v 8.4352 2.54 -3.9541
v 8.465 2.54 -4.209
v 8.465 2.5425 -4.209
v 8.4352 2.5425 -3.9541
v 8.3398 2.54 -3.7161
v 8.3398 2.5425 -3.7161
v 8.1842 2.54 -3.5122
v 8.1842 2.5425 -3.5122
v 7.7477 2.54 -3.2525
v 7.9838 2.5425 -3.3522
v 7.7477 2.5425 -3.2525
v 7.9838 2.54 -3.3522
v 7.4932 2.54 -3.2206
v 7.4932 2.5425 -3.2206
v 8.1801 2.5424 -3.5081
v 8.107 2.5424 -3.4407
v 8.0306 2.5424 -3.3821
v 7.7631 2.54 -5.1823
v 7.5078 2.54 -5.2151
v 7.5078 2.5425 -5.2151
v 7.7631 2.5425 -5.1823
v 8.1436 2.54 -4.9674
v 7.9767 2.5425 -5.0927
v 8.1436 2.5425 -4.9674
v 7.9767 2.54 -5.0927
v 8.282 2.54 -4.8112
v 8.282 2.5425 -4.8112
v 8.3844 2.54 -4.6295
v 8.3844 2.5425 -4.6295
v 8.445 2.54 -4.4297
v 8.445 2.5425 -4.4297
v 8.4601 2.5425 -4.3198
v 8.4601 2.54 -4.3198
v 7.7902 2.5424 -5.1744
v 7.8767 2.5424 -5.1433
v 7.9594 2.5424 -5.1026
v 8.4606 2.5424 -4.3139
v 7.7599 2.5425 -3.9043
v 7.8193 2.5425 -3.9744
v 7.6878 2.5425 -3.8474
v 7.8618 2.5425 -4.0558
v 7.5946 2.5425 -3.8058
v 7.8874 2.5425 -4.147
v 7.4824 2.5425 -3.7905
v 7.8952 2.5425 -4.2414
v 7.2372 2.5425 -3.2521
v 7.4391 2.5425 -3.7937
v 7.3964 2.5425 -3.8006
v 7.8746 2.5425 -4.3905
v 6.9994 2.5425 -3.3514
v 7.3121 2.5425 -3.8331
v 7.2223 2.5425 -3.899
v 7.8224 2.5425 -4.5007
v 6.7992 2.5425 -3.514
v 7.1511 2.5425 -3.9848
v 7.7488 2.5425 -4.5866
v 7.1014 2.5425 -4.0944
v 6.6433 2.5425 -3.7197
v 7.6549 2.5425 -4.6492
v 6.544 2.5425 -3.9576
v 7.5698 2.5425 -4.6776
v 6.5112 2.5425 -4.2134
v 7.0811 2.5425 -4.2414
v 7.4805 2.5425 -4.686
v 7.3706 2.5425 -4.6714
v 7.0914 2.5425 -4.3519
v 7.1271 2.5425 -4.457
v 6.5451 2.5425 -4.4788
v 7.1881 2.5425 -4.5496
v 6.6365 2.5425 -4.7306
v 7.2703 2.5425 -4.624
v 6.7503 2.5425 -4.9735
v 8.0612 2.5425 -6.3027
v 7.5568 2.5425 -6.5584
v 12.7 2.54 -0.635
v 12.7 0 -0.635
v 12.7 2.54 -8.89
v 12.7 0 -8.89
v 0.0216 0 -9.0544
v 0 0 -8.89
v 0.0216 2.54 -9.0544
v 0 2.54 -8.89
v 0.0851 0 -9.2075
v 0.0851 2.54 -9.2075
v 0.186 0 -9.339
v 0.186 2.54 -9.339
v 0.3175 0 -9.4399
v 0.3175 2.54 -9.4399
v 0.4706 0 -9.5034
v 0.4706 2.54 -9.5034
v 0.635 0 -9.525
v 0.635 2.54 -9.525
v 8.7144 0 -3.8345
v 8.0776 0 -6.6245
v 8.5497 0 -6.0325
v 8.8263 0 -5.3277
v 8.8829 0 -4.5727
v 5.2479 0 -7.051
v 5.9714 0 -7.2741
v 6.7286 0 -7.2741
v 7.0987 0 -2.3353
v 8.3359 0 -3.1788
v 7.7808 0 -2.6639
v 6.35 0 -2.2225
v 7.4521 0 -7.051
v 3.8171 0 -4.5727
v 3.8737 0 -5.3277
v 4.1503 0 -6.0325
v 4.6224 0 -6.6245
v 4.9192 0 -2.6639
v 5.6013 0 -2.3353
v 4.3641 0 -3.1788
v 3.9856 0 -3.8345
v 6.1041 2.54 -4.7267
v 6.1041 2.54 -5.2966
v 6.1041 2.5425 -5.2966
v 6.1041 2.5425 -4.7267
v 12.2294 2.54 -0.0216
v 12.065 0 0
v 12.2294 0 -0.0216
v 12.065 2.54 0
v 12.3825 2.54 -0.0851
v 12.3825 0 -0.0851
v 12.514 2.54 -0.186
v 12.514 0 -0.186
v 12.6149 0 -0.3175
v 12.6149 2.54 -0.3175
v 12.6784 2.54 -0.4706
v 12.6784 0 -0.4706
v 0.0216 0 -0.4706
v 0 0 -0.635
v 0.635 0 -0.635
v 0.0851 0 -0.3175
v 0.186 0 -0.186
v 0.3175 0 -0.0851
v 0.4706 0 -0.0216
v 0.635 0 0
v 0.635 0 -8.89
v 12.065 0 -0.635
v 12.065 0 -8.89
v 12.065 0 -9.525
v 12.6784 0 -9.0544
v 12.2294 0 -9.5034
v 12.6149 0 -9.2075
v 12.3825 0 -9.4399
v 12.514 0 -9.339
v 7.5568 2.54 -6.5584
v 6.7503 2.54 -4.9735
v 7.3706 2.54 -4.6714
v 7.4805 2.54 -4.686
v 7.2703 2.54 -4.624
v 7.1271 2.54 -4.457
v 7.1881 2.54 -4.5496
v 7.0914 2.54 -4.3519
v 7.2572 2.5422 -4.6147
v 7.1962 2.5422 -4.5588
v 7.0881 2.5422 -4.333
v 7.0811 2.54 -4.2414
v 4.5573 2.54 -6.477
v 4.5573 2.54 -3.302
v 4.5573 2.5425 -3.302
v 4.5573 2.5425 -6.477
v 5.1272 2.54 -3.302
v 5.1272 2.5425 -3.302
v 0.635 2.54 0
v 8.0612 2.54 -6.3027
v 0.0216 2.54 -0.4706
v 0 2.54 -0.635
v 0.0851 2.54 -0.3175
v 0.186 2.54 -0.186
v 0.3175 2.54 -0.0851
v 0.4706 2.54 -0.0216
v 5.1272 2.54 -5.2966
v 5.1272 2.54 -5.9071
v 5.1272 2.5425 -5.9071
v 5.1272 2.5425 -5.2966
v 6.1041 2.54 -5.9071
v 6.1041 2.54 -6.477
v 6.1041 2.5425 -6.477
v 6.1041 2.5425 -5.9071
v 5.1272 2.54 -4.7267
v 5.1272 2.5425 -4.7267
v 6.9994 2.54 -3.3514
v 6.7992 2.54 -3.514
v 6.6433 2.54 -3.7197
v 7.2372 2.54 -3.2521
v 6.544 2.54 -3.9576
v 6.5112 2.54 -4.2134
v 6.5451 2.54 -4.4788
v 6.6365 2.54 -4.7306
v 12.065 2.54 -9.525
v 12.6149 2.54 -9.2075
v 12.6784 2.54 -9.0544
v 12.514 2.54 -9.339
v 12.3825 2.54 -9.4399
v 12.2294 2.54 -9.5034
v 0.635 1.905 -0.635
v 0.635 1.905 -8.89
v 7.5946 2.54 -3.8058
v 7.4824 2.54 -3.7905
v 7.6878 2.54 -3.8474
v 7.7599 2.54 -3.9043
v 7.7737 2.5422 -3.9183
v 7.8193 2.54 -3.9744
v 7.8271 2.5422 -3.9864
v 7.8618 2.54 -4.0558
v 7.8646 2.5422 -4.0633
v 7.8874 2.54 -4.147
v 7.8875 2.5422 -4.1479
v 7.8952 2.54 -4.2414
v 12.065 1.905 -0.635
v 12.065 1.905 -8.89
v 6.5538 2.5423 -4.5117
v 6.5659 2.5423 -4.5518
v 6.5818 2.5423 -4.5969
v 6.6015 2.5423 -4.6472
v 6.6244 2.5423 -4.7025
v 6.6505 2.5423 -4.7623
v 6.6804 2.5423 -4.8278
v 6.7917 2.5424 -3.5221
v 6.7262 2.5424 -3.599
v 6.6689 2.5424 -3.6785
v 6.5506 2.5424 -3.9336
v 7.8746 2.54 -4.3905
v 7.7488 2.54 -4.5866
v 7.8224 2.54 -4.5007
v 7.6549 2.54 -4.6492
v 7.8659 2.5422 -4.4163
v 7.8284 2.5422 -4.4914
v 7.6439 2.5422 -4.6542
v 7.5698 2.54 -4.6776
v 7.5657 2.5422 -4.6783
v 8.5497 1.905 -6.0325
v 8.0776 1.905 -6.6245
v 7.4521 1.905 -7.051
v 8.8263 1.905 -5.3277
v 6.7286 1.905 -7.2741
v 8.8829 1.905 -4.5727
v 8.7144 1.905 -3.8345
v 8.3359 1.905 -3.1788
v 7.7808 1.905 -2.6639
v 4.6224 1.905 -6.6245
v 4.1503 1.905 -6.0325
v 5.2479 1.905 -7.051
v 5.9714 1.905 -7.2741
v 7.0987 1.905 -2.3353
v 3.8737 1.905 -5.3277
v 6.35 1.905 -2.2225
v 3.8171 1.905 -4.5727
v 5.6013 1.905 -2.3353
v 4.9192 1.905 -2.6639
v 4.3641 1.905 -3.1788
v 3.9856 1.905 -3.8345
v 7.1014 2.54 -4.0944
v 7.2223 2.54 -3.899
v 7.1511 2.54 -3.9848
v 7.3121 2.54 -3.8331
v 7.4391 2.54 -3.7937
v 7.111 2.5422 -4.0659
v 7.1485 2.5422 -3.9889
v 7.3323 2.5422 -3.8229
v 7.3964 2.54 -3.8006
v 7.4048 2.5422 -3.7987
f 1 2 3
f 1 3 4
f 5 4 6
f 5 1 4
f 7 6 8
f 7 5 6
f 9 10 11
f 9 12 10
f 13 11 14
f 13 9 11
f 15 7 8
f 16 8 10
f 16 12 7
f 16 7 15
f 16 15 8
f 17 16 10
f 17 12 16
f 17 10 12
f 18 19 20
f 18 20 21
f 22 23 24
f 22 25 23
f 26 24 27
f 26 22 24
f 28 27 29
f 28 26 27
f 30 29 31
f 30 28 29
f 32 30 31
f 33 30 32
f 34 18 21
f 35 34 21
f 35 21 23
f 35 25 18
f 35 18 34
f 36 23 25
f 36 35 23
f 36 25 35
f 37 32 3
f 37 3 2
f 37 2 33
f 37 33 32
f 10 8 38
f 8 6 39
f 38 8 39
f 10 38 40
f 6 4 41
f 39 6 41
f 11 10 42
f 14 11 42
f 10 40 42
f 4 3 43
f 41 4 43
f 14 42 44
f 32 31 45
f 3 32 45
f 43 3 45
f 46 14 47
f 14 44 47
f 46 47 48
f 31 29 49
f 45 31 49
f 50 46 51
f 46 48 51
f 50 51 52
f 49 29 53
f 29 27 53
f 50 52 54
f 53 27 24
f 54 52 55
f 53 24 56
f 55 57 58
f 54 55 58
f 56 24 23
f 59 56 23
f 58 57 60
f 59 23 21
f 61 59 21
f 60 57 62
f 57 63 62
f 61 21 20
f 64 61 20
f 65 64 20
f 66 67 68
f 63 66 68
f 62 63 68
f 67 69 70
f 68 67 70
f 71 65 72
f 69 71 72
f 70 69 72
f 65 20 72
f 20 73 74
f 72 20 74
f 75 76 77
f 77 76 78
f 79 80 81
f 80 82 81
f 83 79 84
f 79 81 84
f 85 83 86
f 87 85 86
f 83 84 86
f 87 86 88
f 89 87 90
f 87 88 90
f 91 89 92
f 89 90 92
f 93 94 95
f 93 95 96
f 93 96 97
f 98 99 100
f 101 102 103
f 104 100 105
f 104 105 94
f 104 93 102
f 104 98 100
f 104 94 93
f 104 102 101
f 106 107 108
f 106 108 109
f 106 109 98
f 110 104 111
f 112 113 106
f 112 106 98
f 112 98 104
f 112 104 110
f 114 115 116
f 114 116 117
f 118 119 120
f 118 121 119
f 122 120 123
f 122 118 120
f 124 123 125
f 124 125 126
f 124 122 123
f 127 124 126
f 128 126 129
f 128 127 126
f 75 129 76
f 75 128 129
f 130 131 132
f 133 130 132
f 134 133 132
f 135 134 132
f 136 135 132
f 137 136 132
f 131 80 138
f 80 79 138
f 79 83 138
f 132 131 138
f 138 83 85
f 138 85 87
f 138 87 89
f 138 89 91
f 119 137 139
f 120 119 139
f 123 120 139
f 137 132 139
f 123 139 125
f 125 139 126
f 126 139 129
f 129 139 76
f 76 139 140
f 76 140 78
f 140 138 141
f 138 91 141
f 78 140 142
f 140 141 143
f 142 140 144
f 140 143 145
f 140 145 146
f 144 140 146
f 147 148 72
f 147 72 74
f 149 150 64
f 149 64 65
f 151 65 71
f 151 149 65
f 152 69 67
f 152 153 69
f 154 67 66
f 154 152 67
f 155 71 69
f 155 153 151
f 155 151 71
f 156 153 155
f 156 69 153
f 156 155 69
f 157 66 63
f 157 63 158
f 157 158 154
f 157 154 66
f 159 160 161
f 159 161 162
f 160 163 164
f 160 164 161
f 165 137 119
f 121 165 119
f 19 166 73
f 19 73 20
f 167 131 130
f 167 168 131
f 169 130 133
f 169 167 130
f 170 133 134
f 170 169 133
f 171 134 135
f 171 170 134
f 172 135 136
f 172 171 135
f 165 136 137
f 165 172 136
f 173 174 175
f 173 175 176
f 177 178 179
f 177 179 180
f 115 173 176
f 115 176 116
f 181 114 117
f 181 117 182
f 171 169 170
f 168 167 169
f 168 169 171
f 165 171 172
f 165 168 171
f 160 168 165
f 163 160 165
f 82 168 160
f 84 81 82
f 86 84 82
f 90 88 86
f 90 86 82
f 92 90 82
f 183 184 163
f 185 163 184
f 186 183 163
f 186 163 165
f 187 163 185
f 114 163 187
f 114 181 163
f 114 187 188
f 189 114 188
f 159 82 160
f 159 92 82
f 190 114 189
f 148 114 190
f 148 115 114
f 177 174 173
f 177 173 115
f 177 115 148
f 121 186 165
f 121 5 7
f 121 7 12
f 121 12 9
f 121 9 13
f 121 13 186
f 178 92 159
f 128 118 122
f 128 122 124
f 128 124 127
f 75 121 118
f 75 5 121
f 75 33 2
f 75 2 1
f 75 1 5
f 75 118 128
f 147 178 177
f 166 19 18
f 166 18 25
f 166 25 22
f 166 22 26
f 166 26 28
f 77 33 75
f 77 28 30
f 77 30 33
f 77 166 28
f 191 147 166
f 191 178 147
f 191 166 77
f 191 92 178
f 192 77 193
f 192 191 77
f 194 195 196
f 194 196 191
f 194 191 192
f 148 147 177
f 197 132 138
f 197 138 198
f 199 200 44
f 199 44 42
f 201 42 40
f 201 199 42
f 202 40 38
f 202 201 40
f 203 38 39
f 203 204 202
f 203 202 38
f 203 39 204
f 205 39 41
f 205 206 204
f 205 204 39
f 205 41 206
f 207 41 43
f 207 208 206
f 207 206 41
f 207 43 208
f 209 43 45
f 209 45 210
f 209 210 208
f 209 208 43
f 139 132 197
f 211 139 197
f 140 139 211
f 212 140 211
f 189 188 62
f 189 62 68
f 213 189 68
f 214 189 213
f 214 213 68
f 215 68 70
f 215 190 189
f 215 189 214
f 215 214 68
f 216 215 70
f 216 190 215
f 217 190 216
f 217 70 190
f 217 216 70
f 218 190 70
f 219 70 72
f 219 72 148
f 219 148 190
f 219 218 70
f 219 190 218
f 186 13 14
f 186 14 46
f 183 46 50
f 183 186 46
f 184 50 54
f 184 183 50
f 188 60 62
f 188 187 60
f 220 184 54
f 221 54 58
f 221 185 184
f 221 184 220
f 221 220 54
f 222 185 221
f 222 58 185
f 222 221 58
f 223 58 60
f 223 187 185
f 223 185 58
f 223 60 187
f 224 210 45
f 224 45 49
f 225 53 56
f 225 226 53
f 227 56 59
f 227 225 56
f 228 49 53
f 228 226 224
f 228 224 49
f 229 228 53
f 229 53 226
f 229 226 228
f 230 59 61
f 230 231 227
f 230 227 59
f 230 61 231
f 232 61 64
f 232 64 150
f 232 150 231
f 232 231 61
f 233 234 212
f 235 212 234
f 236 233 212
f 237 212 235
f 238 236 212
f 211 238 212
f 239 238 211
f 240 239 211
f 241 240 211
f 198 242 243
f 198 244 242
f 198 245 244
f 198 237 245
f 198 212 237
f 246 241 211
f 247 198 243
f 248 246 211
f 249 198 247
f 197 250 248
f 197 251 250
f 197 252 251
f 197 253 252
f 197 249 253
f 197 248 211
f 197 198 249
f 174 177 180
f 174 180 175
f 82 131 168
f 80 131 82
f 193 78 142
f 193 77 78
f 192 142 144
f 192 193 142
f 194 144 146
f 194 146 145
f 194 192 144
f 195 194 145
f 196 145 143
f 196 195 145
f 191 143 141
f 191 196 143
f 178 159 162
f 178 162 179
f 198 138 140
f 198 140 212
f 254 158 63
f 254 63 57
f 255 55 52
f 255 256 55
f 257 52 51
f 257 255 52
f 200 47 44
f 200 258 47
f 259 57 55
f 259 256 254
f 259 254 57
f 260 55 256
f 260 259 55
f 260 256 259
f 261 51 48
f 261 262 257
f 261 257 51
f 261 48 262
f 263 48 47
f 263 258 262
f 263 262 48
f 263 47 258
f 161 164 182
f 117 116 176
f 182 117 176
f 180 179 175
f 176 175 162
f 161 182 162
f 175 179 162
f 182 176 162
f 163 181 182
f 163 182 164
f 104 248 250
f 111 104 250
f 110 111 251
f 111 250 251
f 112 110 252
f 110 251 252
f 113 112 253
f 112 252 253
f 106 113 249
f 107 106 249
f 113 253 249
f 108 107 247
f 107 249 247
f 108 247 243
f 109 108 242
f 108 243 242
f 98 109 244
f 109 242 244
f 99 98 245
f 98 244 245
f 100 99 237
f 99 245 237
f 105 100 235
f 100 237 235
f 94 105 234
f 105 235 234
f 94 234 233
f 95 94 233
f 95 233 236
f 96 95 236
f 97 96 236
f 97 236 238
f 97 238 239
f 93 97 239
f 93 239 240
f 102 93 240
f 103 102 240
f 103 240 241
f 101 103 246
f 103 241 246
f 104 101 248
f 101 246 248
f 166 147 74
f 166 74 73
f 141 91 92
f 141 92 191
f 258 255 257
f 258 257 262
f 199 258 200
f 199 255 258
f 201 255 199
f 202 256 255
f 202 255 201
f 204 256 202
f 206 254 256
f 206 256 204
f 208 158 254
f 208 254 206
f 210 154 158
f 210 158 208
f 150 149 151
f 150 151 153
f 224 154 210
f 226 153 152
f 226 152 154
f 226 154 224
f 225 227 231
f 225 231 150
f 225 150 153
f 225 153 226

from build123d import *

# Parameters (mm, degrees)
SKETCH1_W           = 12.7
SKETCH1_H           = 9.525
BOSS_EXTRUDE1_DEPTH = 2.54
FILLET1_R           = 0.635
SHELL1_START        = 0.635
SHELL1_OUTLINE_W    = 1.905
SHELL1_OUTLINE_H    = 8.255
SHELL1_DEPTH        = 11.43
SKETCH2_R           = 2.54
BOSS_EXTRUDE2_DEPTH = 1.905
BOSS_EXTRUDE3_DEPTH = 0.00254


# Read off the part's stored shape, not the designer's step: Shell1
with BuildPart() as part:
    # Sketch1 → Boss-Extrude1 (new body)
    with BuildSketch(Plane(origin=(0, 0, 0), x_dir=(1, 0, 0), z_dir=(0, 1, 0))):
        with Locations((6.35, 4.7625)):
            Rectangle(SKETCH1_W, SKETCH1_H)
    extrude(amount=BOSS_EXTRUDE1_DEPTH)

    # Fillet1
    fillet1_edges = [part.edges().sort_by_distance(p)[0] for p in [
        (0, 1.27, -9.525),
        (12.7, 1.27, -9.525),
        (12.7, 1.27, 0),
        (0, 1.27, 0),
    ]]
    fillet(fillet1_edges, radius=FILLET1_R)

    # Shell1 outline → Shell1 (cut)
    with BuildSketch(Plane.YZ.offset(SHELL1_START)):
        with Locations((0.9525, -4.7625)):
            Rectangle(SHELL1_OUTLINE_W, SHELL1_OUTLINE_H)
    extrude(amount=SHELL1_DEPTH, mode=Mode.SUBTRACT)

    # Sketch2 → Boss-Extrude2 (add)
    with BuildSketch(Plane(origin=(0, 1.905, 0), x_dir=(-1, 0, 0), z_dir=(0, -1, 0))):
        with Locations(Location((-6.35, 4.7625, 0), (0, 0, 270))):
            Circle(SKETCH2_R)
    extrude(amount=BOSS_EXTRUDE2_DEPTH)

    # Sketch3 → Boss-Extrude3 (add)
    # profile 1 of 2: a face of its own
    with BuildSketch(Plane(origin=(0, 2.54, 0), x_dir=(1, 0, 0), z_dir=(0, 1, 0))):
        Polygon((4.557346154, 6.477), (6.104141026, 6.477), (6.104141026, 5.907128205), (5.127217949, 5.907128205), (5.127217949, 5.296551282), (6.104141026, 5.296551282), (6.104141026, 4.726679487), (5.127217949, 4.726679487), (5.127217949, 3.302), (4.557346154, 3.302), align=None)
    # profile 2 of 2: a face of its own
    with BuildSketch(Plane(origin=(0, 2.54, 0), x_dir=(1, 0, 0), z_dir=(0, 1, 0))):
        with BuildLine():
            Line((7.556805288, 6.558410256), (8.061167268, 6.30273117))
            Line((8.061167268, 6.30273117), (7.507831931, 5.215141026))
            add(Edge.make_bspline(
                [(7.507831931, 5.215141026), (7.540522464, 5.214294651), (7.604911828, 5.212627578), (7.699647713, 5.199154014), (7.790216983, 5.175861453), (7.877532843, 5.144987227), (7.96052794, 5.103522834), (8.040538956, 5.054198775), (8.115495965, 4.99404278), (8.187117669, 4.92739313), (8.252242916, 4.853554895), (8.308815707, 4.774213367), (8.358117895, 4.691298934), (8.396443432, 4.602956598), (8.427358086, 4.510650736), (8.44966437, 4.41401236), (8.462390729, 4.312761626), (8.46414527, 4.243977417), (8.465038462, 4.208961138)],
                knots=[0, 0, 0, 0, 1.013260694, 1.995783107, 2.958651975, 3.908806537, 4.861209129, 5.829647963, 6.817170299, 7.835534541, 8.860094905, 9.863329007, 10.853101798, 11.844815043, 12.84250023, 13.867713965, 14.914507806, 16, 16, 16, 16], degree=3))
            add(Edge.make_bspline(
                [(8.465038462, 4.208961138), (8.464201467, 4.175207569), (8.462547087, 4.108491238), (8.448871451, 4.010501914), (8.426770904, 3.916486889), (8.395184784, 3.826633922), (8.355036272, 3.740503809), (8.30593736, 3.658147091), (8.24748087, 3.580179194), (8.181177155, 3.507014401), (8.108695756, 3.440324152), (8.032296413, 3.381045977), (7.951331729, 3.332079955), (7.867332031, 3.290727002), (7.778750832, 3.259868741), (7.686913754, 3.236576099), (7.591124371, 3.223135234), (7.526104992, 3.22144503), (7.493203526, 3.220589744)],
                knots=[0, 0, 0, 0, 1.049934834, 2.075270938, 3.072134561, 4.05064612, 5.033440221, 6.024524368, 7.028587226, 8.060776465, 9.092543989, 10.090062252, 11.064205434, 12.031961459, 12.998029633, 13.977230324, 14.976426867, 16, 16, 16, 16], degree=3))
            add(Edge.make_bspline(
                [(7.493203526, 3.220589744), (7.45879859, 3.221291632), (7.391145938, 3.2226718), (7.292153178, 3.238126046), (7.197210601, 3.261390259), (7.1068518, 3.294607602), (7.02051486, 3.336903587), (6.939216244, 3.389240616), (6.862271123, 3.451041549), (6.790499844, 3.520915965), (6.725839271, 3.597453826), (6.668167444, 3.676920054), (6.619377003, 3.759439347), (6.579882279, 3.844923478), (6.54906758, 3.933100047), (6.527626834, 4.024136406), (6.513656209, 4.11779108), (6.512018472, 4.181350442), (6.511192308, 4.213413261)],
                knots=[0, 0, 0, 0, 1.063775006, 2.091769615, 3.092589432, 4.084662827, 5.064601646, 6.061867366, 7.070035304, 8.113879863, 9.156342271, 10.166834137, 11.149076039, 12.117706134, 13.076241869, 14.034148791, 15.008317125, 16, 16, 16, 16], degree=3))
            add(Edge.make_bspline(
                [(6.511192308, 4.213413261), (6.511628837, 4.238242164), (6.512504324, 4.288038176), (6.521302452, 4.362604999), (6.534678698, 4.437367552), (6.550183517, 4.500454562), (6.566148814, 4.553801232), (6.582218008, 4.598947076), (6.602132233, 4.649049092), (6.624897142, 4.70423522), (6.651228609, 4.764439071), (6.680989082, 4.829496544), (6.714252653, 4.899900304), (6.73797416, 4.948256786), (6.750334936, 4.973454327)],
                knots=[0, 0, 0, 0, 1.110454016, 2.227089276, 3.35462975, 4.507227546, 5.131400587, 5.845402449, 6.650387134, 7.543487832, 8.516250726, 9.590168902, 10.744287919, 12, 12, 12, 12], degree=3))
            Line((6.750334936, 4.973454327), (7.556805288, 6.558410256))
        make_face()
        with BuildLine():
            add(Edge.make_bspline(
                [(7.480483173, 4.685974359), (7.45313899, 4.684720139), (7.399630013, 4.682265795), (7.32354825, 4.656562713), (7.254178944, 4.616240974), (7.194048771, 4.560085155), (7.143755415, 4.492976745), (7.106798092, 4.416430641), (7.084566208, 4.331468327), (7.082256458, 4.272064094), (7.081064103, 4.241398037)],
                knots=[0, 0, 0, 0, 0.981744412, 1.921144944, 2.858899012, 3.85339082, 4.86292663, 5.863643845, 6.897155691, 8, 8, 8, 8], degree=3))
            add(Edge.make_bspline(
                [(7.081064103, 4.241398037), (7.082475888, 4.210721768), (7.085221906, 4.151054373), (7.108289737, 4.065283067), (7.146058935, 3.986998689), (7.199027827, 3.919000948), (7.261212545, 3.862557558), (7.330168021, 3.820814972), (7.404744054, 3.795171132), (7.456330117, 3.792042243), (7.482391226, 3.790461538)],
                knots=[0, 0, 0, 0, 1.098279937, 2.136227893, 3.159405121, 4.194678092, 5.206500211, 6.154139736, 7.067477469, 8, 8, 8, 8], degree=3))
            add(Edge.make_bspline(
                [(7.482391226, 3.790461538), (7.509914703, 3.792070396), (7.563893022, 3.795225646), (7.641760287, 3.81979044), (7.7128925, 3.860833701), (7.775787137, 3.917096382), (7.829812434, 3.984318178), (7.867192483, 4.063062388), (7.89132675, 4.149452761), (7.893857997, 4.210062449), (7.895166667, 4.241398037)],
                knots=[0, 0, 0, 0, 0.96921794, 1.900804717, 2.848419905, 3.844199796, 4.861108892, 5.867439427, 6.897452859, 8, 8, 8, 8], degree=3))
            add(Edge.make_bspline(
                [(7.895166667, 4.241398037), (7.893675852, 4.272046189), (7.890788716, 4.331399913), (7.869102903, 4.416760256), (7.830384348, 4.493011323), (7.778953064, 4.560362168), (7.71675353, 4.616492947), (7.644607923, 4.656880703), (7.565050618, 4.682220258), (7.509083321, 4.684704747), (7.480483173, 4.685974359)],
                knots=[0, 0, 0, 0, 1.083229974, 2.097801324, 3.086792542, 4.086858909, 5.079819718, 6.026392613, 6.991456328, 8, 8, 8, 8], degree=3))
        make_face(mode=Mode.SUBTRACT)
    extrude(amount=BOSS_EXTRUDE3_DEPTH)


solid = part.part
